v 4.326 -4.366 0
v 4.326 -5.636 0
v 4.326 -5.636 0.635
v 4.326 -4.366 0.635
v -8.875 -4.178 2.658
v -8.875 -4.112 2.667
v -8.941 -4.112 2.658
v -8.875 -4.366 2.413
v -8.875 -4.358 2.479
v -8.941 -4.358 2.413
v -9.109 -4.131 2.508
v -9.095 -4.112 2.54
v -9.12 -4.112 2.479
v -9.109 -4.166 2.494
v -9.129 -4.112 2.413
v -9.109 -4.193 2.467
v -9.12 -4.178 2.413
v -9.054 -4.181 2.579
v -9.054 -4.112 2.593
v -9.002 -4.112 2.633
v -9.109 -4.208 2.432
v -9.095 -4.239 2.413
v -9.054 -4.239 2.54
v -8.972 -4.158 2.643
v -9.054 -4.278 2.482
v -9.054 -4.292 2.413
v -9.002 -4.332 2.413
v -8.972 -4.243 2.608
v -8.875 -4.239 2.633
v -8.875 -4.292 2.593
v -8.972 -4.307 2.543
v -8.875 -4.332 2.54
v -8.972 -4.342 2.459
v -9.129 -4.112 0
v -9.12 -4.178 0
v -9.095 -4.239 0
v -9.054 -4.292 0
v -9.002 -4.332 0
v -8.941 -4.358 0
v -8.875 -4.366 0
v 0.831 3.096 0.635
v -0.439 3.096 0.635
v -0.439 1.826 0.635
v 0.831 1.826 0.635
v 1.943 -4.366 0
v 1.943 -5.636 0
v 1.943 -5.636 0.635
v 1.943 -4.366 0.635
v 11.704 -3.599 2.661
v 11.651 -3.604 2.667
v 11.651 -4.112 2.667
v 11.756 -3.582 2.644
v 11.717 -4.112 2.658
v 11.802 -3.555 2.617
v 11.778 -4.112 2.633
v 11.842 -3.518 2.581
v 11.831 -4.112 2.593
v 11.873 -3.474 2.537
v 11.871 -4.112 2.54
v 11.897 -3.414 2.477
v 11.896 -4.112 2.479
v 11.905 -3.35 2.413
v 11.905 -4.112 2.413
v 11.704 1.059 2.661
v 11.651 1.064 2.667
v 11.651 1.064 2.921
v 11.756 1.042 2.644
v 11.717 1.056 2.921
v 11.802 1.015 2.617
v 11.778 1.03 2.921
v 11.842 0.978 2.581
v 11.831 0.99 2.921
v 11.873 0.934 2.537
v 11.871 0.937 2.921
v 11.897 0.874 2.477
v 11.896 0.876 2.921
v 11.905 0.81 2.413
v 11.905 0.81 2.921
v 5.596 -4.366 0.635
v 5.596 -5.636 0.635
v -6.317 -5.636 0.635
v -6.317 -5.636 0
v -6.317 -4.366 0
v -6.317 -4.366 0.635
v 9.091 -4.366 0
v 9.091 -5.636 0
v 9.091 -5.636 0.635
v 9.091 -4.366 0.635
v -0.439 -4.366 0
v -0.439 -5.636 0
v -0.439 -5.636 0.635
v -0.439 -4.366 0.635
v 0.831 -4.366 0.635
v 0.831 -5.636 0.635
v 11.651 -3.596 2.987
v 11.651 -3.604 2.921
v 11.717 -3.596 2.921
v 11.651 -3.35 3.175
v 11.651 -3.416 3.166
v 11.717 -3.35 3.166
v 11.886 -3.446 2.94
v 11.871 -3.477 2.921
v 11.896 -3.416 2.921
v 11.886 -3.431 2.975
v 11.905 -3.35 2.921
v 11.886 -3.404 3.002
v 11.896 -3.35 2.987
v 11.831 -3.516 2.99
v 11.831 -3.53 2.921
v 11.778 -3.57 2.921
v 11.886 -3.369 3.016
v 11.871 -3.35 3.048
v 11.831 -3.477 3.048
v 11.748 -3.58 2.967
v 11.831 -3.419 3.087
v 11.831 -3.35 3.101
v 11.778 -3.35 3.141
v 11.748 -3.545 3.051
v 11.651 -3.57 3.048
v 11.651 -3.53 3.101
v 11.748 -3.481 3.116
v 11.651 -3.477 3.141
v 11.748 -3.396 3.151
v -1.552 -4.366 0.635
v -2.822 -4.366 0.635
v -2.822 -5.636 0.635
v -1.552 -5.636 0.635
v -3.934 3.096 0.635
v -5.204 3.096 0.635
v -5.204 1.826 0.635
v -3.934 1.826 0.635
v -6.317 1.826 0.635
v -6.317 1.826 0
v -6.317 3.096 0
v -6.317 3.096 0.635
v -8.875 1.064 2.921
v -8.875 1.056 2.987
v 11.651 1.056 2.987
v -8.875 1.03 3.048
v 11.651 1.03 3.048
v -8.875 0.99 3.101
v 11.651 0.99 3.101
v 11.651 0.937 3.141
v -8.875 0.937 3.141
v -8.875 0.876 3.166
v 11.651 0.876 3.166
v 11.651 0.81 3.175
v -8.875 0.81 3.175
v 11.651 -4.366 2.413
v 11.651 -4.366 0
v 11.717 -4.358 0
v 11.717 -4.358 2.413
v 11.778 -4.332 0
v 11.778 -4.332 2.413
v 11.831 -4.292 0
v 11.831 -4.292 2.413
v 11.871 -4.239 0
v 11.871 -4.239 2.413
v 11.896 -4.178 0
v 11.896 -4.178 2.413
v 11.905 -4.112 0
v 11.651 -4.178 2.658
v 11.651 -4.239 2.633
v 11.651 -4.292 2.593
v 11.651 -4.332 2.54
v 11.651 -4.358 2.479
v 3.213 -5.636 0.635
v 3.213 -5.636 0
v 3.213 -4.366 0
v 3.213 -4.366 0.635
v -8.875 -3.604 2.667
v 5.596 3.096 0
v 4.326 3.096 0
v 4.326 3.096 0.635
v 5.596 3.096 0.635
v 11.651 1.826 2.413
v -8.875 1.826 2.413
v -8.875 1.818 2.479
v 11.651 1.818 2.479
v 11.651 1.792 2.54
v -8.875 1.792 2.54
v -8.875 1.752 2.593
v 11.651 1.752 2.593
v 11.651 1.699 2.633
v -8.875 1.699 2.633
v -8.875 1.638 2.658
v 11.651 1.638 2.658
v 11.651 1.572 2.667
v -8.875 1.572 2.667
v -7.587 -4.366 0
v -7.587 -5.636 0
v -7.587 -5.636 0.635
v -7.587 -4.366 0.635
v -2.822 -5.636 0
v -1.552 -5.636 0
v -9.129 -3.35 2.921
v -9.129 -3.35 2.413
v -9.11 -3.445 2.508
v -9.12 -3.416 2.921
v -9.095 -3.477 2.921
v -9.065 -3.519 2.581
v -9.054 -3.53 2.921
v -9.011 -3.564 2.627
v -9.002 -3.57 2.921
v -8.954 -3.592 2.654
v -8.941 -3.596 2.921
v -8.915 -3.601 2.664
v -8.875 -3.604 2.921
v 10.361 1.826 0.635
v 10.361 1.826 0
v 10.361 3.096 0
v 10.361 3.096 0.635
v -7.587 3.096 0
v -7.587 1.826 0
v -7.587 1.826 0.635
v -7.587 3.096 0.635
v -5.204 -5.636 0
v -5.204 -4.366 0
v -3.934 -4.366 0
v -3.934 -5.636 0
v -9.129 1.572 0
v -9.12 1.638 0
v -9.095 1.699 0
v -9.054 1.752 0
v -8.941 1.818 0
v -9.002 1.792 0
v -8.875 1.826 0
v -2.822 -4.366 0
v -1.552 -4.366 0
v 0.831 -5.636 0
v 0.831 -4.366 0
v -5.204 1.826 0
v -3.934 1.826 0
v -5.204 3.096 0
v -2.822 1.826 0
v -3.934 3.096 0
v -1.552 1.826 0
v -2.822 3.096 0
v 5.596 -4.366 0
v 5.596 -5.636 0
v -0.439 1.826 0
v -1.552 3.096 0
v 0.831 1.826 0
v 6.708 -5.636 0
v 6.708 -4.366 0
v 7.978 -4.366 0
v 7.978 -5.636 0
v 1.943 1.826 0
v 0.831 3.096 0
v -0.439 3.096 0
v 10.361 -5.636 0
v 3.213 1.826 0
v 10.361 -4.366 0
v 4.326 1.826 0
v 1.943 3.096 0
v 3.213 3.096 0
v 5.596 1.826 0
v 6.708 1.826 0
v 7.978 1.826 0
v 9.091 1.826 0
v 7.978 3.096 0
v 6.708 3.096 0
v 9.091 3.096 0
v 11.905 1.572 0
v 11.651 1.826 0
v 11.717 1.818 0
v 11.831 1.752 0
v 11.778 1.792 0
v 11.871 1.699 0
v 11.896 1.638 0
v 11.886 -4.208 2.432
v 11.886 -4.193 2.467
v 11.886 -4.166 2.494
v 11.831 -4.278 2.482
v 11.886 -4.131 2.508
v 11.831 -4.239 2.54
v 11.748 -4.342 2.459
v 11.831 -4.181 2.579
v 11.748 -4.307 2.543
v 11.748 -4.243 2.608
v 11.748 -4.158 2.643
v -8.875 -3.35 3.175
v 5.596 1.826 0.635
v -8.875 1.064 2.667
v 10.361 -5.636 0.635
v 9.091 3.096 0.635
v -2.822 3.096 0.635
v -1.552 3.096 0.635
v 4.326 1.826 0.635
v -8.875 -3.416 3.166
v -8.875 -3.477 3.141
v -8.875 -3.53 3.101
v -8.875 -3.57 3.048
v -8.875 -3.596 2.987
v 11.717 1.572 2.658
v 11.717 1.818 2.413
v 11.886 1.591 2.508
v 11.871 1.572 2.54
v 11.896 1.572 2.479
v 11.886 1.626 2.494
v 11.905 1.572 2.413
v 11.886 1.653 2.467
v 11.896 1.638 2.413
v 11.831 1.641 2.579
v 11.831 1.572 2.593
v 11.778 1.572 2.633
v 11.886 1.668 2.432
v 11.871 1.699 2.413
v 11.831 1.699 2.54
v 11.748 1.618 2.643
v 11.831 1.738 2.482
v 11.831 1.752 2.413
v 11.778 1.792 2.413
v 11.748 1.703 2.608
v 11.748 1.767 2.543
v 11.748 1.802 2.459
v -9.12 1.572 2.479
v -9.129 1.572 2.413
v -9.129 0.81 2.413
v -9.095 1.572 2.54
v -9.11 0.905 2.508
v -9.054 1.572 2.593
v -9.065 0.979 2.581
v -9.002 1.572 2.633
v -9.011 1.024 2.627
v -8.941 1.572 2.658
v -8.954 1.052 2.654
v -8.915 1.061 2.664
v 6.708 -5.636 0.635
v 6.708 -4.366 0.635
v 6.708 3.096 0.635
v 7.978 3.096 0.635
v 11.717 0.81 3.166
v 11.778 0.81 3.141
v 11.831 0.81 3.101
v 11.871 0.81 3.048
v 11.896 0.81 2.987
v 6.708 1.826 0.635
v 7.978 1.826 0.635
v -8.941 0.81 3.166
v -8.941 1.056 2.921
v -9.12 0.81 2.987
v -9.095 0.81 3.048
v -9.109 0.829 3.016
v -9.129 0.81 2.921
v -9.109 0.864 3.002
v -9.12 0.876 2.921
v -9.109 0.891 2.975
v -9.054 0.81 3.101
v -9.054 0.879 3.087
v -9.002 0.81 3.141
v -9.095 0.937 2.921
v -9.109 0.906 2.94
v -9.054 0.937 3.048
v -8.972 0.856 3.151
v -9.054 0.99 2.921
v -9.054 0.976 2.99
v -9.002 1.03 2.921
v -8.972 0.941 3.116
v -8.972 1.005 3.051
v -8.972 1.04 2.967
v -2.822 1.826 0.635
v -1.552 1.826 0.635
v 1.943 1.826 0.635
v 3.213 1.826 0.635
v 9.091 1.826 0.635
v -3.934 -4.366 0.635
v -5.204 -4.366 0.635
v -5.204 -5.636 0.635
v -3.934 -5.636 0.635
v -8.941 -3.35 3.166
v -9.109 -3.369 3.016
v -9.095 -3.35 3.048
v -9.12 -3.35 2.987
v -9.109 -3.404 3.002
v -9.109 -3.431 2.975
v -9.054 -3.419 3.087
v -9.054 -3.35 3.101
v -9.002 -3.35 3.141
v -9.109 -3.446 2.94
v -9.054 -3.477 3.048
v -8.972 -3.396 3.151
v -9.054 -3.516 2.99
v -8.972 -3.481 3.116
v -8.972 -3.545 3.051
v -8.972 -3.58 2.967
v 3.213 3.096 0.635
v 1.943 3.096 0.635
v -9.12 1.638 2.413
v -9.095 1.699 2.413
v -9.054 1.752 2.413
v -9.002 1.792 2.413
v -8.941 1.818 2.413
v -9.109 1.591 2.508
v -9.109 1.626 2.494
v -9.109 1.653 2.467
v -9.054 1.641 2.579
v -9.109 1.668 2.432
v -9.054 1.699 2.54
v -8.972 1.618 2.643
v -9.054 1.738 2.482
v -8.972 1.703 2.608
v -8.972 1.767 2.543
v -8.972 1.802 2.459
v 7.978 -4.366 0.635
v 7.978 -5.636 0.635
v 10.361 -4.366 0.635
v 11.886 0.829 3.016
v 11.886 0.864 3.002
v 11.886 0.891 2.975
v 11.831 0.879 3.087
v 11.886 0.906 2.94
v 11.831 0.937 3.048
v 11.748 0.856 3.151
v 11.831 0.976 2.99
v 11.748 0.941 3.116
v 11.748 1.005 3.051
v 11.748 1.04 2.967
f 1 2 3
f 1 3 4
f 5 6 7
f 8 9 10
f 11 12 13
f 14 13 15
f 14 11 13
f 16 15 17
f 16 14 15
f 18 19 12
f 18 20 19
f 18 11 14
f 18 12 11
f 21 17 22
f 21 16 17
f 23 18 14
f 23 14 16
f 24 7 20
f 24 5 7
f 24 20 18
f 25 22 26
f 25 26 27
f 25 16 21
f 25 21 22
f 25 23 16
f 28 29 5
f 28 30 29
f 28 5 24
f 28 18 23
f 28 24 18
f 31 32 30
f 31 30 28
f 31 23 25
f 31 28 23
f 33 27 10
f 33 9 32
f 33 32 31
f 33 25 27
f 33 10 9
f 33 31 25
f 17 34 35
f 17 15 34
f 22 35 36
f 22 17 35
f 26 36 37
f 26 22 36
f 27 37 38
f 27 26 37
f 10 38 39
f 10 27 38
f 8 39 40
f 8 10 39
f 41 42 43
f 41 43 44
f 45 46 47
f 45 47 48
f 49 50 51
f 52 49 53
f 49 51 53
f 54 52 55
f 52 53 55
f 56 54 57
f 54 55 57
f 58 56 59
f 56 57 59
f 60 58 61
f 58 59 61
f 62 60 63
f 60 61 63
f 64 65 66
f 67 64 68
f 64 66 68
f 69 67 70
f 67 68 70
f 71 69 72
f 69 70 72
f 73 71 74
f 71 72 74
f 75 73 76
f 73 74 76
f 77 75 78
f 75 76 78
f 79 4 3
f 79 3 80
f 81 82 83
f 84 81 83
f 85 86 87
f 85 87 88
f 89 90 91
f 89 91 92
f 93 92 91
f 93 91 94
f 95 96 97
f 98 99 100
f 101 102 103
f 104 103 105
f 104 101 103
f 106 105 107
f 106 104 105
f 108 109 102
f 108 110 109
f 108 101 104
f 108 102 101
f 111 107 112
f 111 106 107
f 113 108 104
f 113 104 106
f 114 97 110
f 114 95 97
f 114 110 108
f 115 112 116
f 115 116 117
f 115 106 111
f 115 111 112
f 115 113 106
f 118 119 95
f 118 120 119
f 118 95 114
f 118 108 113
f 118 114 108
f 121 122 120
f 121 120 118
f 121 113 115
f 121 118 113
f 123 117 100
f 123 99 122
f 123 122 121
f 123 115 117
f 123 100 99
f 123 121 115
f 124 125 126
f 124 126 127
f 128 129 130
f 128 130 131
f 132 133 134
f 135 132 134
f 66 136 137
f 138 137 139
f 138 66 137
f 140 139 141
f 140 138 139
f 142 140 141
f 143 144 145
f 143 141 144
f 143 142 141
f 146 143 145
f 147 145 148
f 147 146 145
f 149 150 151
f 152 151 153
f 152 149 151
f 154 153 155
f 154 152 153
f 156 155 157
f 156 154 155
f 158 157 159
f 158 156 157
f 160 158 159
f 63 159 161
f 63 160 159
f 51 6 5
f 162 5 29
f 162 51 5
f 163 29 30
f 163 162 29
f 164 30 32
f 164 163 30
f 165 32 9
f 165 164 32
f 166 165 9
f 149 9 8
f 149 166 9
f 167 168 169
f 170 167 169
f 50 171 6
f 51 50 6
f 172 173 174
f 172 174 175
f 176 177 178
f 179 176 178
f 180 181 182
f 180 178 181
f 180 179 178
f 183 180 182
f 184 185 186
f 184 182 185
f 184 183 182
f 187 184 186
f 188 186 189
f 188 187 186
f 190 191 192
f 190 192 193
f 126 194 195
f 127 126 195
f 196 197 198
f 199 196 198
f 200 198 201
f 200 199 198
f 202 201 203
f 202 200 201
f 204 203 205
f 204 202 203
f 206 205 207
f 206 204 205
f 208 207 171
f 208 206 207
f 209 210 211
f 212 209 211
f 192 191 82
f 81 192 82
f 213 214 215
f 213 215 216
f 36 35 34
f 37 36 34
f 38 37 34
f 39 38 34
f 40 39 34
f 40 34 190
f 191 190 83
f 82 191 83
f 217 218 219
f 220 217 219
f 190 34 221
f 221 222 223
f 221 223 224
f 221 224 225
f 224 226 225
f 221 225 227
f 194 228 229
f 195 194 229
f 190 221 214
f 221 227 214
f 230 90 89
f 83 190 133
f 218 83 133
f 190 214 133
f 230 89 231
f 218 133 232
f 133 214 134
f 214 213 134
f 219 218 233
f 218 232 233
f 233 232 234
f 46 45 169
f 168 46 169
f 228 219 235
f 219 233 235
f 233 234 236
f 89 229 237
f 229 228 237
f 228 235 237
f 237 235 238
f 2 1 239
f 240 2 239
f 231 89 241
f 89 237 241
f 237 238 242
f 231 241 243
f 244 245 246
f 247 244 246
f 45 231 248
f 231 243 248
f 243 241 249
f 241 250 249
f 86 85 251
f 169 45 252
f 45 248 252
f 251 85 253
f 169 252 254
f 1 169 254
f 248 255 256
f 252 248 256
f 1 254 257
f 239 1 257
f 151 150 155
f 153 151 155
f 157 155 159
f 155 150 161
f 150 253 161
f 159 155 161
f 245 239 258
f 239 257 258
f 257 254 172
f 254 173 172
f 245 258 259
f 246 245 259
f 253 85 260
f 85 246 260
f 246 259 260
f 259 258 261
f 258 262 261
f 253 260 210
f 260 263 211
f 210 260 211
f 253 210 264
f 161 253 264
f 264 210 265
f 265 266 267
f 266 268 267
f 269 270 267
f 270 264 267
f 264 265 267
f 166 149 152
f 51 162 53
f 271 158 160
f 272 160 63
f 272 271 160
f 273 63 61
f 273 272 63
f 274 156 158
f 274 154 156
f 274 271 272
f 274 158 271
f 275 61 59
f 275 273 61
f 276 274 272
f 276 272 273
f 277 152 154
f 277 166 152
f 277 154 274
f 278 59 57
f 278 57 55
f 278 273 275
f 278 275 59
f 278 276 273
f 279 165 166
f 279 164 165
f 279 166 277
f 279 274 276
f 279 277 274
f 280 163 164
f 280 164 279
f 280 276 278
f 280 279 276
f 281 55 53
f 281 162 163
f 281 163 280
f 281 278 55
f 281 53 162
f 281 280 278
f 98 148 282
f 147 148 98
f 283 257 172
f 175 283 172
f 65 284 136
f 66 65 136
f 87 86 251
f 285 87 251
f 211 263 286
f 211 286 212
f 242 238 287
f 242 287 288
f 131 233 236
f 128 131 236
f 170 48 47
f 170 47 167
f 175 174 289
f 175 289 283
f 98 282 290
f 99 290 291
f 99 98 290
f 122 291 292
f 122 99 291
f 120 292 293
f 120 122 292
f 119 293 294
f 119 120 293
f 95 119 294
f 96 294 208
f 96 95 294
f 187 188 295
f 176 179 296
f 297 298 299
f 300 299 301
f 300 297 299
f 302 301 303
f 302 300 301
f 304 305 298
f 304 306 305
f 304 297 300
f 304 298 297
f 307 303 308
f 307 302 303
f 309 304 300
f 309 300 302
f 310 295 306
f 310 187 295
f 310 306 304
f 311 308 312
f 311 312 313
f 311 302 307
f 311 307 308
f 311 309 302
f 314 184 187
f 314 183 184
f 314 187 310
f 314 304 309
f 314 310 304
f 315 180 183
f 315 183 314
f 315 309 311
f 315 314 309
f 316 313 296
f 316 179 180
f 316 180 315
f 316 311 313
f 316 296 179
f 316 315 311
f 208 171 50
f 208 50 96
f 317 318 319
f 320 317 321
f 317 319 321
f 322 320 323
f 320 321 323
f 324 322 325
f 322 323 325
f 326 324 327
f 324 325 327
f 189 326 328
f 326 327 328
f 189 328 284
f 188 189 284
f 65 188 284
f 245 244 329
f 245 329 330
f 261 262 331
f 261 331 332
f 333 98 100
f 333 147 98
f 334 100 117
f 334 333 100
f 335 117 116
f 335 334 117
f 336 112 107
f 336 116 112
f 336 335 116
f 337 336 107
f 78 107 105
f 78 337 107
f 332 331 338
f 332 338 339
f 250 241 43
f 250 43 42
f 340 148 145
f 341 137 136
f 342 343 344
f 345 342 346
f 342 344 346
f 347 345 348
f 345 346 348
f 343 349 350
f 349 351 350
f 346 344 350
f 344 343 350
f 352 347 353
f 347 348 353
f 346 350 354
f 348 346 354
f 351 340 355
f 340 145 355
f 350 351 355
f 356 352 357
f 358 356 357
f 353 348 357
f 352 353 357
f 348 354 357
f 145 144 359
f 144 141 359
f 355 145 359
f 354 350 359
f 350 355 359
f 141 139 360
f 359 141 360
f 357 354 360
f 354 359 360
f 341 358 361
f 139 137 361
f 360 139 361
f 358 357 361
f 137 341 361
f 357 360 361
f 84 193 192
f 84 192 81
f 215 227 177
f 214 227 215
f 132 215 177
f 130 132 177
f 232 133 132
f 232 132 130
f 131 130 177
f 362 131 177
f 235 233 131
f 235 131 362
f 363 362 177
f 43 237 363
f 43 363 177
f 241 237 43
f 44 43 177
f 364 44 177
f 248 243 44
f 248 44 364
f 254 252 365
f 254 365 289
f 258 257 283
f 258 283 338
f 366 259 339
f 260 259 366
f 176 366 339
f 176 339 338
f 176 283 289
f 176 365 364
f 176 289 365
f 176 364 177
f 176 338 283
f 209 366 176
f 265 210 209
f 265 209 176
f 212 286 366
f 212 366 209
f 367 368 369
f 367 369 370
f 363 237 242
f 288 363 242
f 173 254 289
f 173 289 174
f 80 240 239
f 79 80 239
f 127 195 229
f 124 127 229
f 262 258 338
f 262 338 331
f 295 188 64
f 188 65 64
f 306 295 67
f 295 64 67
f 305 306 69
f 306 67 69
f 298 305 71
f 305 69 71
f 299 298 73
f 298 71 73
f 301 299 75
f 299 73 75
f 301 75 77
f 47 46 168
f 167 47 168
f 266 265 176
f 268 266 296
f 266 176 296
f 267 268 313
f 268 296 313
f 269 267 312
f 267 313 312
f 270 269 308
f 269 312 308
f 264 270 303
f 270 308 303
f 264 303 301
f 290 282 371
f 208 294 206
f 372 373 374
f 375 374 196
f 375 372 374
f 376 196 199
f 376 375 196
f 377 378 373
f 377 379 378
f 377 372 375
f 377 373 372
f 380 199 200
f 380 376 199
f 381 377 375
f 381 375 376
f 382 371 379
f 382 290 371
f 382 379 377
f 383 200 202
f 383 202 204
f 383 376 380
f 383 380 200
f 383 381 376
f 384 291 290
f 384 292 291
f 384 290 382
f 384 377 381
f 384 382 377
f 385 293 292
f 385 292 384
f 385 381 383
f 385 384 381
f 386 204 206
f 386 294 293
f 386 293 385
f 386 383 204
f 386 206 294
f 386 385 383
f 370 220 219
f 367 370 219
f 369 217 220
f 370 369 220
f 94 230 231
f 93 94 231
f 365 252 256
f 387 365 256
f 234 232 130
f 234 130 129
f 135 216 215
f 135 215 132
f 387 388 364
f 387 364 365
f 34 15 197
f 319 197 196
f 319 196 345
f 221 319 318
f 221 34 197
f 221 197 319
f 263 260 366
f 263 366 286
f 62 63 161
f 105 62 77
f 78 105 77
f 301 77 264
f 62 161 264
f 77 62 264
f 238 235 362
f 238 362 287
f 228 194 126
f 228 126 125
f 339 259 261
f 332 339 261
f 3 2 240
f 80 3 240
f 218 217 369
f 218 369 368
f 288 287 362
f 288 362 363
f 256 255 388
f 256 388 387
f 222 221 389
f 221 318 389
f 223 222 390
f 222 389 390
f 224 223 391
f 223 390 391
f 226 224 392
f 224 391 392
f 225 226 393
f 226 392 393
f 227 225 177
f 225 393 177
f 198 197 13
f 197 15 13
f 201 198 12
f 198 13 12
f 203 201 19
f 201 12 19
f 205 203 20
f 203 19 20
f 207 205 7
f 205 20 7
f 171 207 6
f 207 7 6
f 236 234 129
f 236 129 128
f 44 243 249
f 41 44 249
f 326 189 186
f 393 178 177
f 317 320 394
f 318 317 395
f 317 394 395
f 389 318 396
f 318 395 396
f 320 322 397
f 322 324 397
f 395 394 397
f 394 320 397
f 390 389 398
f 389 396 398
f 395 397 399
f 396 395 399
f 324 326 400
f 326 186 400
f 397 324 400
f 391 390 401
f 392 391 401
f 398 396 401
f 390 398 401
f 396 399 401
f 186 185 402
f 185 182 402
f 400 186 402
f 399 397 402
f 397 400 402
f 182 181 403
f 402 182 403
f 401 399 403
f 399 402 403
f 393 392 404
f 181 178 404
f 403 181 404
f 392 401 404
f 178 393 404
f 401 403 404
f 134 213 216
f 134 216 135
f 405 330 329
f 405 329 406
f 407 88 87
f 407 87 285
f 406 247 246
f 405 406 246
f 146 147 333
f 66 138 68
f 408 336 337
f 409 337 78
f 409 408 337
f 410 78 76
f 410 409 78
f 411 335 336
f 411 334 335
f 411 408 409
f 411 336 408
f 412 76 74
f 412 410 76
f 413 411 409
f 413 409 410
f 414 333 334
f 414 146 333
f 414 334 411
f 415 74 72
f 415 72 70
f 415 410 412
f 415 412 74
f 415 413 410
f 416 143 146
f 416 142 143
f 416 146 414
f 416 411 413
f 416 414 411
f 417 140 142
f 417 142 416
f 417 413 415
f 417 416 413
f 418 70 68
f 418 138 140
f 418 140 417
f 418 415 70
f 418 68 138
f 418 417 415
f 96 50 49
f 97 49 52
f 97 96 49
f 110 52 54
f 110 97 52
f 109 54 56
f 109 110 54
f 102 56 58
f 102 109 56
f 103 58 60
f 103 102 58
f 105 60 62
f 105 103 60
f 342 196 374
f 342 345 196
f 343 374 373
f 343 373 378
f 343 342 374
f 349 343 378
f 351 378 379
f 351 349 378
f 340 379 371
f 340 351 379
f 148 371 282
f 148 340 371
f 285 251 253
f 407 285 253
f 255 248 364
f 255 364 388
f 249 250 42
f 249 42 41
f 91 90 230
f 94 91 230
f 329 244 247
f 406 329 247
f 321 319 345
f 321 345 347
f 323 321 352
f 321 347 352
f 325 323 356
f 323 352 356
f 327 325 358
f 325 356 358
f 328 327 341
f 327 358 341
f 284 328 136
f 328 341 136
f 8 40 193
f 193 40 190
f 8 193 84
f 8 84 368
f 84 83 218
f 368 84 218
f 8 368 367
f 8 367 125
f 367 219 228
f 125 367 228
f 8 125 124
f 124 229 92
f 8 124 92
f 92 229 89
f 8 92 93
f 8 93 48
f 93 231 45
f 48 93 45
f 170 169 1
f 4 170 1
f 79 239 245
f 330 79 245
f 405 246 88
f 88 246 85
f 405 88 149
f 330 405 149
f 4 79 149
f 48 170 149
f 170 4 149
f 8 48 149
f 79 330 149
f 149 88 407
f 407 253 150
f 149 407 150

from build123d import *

# Parameters (mm, degrees)
F0_W     = 21.03374
F0_H     = 6.19252
F1_DEPTH = 3.175
F2_W     = 1.27
F2_H     = 1.27
F3_DEPTH = 0.635
F5_W     = 0.762
F5_H     = 0.508
F6_DEPTH = 25.4
F7_R     = 0.254


with BuildPart() as f1:
    # F0 (on Top) → F1 (new body)
    with BuildSketch(Plane.XY):
        with Locations((1.38811, -1.27)):
            Rectangle(F0_W, F0_H)
    extrude(amount=F1_DEPTH)

    # F2 (on Top) → F3 (join)
    with BuildSketch(Plane.XY):
        with Locations((-6.95198, 2.46126)):
            Rectangle(F2_W, F2_H)
        with Locations((-4.56946, 2.46126)):
            Rectangle(F2_W, F2_H)
        with Locations((-2.18694, 2.46126)):
            Rectangle(F2_W, F2_H)
        with Locations((0.19558, 2.46126)):
            Rectangle(F2_W, F2_H)
        with Locations((2.5781, 2.46126)):
            Rectangle(F2_W, F2_H)
        with Locations((4.96062, 2.46126)):
            Rectangle(F2_W, F2_H)
        with Locations((7.34314, 2.46126)):
            Rectangle(F2_W, F2_H)
        with Locations((-6.95198, -5.00126)):
            Rectangle(F2_W, F2_H)
        with Locations((-4.56946, -5.00126)):
            Rectangle(F2_W, F2_H)
        with Locations((-2.18694, -5.00126)):
            Rectangle(F2_W, F2_H)
        with Locations((0.19558, -5.00126)):
            Rectangle(F2_W, F2_H)
        with Locations((2.5781, -5.00126)):
            Rectangle(F2_W, F2_H)
        with Locations((4.96062, -5.00126)):
            Rectangle(F2_W, F2_H)
        with Locations((7.34314, -5.00126)):
            Rectangle(F2_W, F2_H)
        with Locations((9.72566, 2.46126)):
            Rectangle(F2_W, F2_H)
        with Locations((9.72566, -5.00126)):
            Rectangle(F2_W, F2_H)
    extrude(amount=F3_DEPTH)

    # F5 (on face) → F6 (cut)
    with BuildSketch(Plane(origin=(-9.12876, 0, 0), x_dir=(0, -1, 0), z_dir=(-1, 0, 0))):
        with Locations((-1.44526, 2.921)):
            Rectangle(F5_W, F5_H)
        with Locations((3.98526, 2.921)):
            Rectangle(F5_W, F5_H)
    extrude(amount=-F6_DEPTH, mode=Mode.SUBTRACT)

    # F7
    f7_edges = [f1.edges().sort_by_distance(p)[0] for p in [
        (1.38811, 1.82626, 2.667),
        (1.38811, 1.06426, 3.175),
        (1.38811, -3.60426, 3.175),
        (1.38811, -4.36626, 2.667),
        (-9.12876, -1.27, 3.175),
        (-9.12876, -3.60426, 2.921),
        (-9.12876, -3.98526, 2.667),
        (-9.12876, -4.36626, 1.3335),
        (-9.12876, 1.44526, 2.667),
        (-9.12876, 1.06426, 2.921),
        (-9.12876, 1.82626, 1.3335),
        (11.90498, -4.36626, 1.3335),
        (11.90498, -3.98526, 2.667),
        (11.90498, -3.60426, 2.921),
        (11.90498, -1.27, 3.175),
        (11.90498, 1.06426, 2.921),
        (11.90498, 1.44526, 2.667),
        (11.90498, 1.82626, 1.3335),
    ]]
    fillet(f7_edges, radius=F7_R)


solid = f1.part
